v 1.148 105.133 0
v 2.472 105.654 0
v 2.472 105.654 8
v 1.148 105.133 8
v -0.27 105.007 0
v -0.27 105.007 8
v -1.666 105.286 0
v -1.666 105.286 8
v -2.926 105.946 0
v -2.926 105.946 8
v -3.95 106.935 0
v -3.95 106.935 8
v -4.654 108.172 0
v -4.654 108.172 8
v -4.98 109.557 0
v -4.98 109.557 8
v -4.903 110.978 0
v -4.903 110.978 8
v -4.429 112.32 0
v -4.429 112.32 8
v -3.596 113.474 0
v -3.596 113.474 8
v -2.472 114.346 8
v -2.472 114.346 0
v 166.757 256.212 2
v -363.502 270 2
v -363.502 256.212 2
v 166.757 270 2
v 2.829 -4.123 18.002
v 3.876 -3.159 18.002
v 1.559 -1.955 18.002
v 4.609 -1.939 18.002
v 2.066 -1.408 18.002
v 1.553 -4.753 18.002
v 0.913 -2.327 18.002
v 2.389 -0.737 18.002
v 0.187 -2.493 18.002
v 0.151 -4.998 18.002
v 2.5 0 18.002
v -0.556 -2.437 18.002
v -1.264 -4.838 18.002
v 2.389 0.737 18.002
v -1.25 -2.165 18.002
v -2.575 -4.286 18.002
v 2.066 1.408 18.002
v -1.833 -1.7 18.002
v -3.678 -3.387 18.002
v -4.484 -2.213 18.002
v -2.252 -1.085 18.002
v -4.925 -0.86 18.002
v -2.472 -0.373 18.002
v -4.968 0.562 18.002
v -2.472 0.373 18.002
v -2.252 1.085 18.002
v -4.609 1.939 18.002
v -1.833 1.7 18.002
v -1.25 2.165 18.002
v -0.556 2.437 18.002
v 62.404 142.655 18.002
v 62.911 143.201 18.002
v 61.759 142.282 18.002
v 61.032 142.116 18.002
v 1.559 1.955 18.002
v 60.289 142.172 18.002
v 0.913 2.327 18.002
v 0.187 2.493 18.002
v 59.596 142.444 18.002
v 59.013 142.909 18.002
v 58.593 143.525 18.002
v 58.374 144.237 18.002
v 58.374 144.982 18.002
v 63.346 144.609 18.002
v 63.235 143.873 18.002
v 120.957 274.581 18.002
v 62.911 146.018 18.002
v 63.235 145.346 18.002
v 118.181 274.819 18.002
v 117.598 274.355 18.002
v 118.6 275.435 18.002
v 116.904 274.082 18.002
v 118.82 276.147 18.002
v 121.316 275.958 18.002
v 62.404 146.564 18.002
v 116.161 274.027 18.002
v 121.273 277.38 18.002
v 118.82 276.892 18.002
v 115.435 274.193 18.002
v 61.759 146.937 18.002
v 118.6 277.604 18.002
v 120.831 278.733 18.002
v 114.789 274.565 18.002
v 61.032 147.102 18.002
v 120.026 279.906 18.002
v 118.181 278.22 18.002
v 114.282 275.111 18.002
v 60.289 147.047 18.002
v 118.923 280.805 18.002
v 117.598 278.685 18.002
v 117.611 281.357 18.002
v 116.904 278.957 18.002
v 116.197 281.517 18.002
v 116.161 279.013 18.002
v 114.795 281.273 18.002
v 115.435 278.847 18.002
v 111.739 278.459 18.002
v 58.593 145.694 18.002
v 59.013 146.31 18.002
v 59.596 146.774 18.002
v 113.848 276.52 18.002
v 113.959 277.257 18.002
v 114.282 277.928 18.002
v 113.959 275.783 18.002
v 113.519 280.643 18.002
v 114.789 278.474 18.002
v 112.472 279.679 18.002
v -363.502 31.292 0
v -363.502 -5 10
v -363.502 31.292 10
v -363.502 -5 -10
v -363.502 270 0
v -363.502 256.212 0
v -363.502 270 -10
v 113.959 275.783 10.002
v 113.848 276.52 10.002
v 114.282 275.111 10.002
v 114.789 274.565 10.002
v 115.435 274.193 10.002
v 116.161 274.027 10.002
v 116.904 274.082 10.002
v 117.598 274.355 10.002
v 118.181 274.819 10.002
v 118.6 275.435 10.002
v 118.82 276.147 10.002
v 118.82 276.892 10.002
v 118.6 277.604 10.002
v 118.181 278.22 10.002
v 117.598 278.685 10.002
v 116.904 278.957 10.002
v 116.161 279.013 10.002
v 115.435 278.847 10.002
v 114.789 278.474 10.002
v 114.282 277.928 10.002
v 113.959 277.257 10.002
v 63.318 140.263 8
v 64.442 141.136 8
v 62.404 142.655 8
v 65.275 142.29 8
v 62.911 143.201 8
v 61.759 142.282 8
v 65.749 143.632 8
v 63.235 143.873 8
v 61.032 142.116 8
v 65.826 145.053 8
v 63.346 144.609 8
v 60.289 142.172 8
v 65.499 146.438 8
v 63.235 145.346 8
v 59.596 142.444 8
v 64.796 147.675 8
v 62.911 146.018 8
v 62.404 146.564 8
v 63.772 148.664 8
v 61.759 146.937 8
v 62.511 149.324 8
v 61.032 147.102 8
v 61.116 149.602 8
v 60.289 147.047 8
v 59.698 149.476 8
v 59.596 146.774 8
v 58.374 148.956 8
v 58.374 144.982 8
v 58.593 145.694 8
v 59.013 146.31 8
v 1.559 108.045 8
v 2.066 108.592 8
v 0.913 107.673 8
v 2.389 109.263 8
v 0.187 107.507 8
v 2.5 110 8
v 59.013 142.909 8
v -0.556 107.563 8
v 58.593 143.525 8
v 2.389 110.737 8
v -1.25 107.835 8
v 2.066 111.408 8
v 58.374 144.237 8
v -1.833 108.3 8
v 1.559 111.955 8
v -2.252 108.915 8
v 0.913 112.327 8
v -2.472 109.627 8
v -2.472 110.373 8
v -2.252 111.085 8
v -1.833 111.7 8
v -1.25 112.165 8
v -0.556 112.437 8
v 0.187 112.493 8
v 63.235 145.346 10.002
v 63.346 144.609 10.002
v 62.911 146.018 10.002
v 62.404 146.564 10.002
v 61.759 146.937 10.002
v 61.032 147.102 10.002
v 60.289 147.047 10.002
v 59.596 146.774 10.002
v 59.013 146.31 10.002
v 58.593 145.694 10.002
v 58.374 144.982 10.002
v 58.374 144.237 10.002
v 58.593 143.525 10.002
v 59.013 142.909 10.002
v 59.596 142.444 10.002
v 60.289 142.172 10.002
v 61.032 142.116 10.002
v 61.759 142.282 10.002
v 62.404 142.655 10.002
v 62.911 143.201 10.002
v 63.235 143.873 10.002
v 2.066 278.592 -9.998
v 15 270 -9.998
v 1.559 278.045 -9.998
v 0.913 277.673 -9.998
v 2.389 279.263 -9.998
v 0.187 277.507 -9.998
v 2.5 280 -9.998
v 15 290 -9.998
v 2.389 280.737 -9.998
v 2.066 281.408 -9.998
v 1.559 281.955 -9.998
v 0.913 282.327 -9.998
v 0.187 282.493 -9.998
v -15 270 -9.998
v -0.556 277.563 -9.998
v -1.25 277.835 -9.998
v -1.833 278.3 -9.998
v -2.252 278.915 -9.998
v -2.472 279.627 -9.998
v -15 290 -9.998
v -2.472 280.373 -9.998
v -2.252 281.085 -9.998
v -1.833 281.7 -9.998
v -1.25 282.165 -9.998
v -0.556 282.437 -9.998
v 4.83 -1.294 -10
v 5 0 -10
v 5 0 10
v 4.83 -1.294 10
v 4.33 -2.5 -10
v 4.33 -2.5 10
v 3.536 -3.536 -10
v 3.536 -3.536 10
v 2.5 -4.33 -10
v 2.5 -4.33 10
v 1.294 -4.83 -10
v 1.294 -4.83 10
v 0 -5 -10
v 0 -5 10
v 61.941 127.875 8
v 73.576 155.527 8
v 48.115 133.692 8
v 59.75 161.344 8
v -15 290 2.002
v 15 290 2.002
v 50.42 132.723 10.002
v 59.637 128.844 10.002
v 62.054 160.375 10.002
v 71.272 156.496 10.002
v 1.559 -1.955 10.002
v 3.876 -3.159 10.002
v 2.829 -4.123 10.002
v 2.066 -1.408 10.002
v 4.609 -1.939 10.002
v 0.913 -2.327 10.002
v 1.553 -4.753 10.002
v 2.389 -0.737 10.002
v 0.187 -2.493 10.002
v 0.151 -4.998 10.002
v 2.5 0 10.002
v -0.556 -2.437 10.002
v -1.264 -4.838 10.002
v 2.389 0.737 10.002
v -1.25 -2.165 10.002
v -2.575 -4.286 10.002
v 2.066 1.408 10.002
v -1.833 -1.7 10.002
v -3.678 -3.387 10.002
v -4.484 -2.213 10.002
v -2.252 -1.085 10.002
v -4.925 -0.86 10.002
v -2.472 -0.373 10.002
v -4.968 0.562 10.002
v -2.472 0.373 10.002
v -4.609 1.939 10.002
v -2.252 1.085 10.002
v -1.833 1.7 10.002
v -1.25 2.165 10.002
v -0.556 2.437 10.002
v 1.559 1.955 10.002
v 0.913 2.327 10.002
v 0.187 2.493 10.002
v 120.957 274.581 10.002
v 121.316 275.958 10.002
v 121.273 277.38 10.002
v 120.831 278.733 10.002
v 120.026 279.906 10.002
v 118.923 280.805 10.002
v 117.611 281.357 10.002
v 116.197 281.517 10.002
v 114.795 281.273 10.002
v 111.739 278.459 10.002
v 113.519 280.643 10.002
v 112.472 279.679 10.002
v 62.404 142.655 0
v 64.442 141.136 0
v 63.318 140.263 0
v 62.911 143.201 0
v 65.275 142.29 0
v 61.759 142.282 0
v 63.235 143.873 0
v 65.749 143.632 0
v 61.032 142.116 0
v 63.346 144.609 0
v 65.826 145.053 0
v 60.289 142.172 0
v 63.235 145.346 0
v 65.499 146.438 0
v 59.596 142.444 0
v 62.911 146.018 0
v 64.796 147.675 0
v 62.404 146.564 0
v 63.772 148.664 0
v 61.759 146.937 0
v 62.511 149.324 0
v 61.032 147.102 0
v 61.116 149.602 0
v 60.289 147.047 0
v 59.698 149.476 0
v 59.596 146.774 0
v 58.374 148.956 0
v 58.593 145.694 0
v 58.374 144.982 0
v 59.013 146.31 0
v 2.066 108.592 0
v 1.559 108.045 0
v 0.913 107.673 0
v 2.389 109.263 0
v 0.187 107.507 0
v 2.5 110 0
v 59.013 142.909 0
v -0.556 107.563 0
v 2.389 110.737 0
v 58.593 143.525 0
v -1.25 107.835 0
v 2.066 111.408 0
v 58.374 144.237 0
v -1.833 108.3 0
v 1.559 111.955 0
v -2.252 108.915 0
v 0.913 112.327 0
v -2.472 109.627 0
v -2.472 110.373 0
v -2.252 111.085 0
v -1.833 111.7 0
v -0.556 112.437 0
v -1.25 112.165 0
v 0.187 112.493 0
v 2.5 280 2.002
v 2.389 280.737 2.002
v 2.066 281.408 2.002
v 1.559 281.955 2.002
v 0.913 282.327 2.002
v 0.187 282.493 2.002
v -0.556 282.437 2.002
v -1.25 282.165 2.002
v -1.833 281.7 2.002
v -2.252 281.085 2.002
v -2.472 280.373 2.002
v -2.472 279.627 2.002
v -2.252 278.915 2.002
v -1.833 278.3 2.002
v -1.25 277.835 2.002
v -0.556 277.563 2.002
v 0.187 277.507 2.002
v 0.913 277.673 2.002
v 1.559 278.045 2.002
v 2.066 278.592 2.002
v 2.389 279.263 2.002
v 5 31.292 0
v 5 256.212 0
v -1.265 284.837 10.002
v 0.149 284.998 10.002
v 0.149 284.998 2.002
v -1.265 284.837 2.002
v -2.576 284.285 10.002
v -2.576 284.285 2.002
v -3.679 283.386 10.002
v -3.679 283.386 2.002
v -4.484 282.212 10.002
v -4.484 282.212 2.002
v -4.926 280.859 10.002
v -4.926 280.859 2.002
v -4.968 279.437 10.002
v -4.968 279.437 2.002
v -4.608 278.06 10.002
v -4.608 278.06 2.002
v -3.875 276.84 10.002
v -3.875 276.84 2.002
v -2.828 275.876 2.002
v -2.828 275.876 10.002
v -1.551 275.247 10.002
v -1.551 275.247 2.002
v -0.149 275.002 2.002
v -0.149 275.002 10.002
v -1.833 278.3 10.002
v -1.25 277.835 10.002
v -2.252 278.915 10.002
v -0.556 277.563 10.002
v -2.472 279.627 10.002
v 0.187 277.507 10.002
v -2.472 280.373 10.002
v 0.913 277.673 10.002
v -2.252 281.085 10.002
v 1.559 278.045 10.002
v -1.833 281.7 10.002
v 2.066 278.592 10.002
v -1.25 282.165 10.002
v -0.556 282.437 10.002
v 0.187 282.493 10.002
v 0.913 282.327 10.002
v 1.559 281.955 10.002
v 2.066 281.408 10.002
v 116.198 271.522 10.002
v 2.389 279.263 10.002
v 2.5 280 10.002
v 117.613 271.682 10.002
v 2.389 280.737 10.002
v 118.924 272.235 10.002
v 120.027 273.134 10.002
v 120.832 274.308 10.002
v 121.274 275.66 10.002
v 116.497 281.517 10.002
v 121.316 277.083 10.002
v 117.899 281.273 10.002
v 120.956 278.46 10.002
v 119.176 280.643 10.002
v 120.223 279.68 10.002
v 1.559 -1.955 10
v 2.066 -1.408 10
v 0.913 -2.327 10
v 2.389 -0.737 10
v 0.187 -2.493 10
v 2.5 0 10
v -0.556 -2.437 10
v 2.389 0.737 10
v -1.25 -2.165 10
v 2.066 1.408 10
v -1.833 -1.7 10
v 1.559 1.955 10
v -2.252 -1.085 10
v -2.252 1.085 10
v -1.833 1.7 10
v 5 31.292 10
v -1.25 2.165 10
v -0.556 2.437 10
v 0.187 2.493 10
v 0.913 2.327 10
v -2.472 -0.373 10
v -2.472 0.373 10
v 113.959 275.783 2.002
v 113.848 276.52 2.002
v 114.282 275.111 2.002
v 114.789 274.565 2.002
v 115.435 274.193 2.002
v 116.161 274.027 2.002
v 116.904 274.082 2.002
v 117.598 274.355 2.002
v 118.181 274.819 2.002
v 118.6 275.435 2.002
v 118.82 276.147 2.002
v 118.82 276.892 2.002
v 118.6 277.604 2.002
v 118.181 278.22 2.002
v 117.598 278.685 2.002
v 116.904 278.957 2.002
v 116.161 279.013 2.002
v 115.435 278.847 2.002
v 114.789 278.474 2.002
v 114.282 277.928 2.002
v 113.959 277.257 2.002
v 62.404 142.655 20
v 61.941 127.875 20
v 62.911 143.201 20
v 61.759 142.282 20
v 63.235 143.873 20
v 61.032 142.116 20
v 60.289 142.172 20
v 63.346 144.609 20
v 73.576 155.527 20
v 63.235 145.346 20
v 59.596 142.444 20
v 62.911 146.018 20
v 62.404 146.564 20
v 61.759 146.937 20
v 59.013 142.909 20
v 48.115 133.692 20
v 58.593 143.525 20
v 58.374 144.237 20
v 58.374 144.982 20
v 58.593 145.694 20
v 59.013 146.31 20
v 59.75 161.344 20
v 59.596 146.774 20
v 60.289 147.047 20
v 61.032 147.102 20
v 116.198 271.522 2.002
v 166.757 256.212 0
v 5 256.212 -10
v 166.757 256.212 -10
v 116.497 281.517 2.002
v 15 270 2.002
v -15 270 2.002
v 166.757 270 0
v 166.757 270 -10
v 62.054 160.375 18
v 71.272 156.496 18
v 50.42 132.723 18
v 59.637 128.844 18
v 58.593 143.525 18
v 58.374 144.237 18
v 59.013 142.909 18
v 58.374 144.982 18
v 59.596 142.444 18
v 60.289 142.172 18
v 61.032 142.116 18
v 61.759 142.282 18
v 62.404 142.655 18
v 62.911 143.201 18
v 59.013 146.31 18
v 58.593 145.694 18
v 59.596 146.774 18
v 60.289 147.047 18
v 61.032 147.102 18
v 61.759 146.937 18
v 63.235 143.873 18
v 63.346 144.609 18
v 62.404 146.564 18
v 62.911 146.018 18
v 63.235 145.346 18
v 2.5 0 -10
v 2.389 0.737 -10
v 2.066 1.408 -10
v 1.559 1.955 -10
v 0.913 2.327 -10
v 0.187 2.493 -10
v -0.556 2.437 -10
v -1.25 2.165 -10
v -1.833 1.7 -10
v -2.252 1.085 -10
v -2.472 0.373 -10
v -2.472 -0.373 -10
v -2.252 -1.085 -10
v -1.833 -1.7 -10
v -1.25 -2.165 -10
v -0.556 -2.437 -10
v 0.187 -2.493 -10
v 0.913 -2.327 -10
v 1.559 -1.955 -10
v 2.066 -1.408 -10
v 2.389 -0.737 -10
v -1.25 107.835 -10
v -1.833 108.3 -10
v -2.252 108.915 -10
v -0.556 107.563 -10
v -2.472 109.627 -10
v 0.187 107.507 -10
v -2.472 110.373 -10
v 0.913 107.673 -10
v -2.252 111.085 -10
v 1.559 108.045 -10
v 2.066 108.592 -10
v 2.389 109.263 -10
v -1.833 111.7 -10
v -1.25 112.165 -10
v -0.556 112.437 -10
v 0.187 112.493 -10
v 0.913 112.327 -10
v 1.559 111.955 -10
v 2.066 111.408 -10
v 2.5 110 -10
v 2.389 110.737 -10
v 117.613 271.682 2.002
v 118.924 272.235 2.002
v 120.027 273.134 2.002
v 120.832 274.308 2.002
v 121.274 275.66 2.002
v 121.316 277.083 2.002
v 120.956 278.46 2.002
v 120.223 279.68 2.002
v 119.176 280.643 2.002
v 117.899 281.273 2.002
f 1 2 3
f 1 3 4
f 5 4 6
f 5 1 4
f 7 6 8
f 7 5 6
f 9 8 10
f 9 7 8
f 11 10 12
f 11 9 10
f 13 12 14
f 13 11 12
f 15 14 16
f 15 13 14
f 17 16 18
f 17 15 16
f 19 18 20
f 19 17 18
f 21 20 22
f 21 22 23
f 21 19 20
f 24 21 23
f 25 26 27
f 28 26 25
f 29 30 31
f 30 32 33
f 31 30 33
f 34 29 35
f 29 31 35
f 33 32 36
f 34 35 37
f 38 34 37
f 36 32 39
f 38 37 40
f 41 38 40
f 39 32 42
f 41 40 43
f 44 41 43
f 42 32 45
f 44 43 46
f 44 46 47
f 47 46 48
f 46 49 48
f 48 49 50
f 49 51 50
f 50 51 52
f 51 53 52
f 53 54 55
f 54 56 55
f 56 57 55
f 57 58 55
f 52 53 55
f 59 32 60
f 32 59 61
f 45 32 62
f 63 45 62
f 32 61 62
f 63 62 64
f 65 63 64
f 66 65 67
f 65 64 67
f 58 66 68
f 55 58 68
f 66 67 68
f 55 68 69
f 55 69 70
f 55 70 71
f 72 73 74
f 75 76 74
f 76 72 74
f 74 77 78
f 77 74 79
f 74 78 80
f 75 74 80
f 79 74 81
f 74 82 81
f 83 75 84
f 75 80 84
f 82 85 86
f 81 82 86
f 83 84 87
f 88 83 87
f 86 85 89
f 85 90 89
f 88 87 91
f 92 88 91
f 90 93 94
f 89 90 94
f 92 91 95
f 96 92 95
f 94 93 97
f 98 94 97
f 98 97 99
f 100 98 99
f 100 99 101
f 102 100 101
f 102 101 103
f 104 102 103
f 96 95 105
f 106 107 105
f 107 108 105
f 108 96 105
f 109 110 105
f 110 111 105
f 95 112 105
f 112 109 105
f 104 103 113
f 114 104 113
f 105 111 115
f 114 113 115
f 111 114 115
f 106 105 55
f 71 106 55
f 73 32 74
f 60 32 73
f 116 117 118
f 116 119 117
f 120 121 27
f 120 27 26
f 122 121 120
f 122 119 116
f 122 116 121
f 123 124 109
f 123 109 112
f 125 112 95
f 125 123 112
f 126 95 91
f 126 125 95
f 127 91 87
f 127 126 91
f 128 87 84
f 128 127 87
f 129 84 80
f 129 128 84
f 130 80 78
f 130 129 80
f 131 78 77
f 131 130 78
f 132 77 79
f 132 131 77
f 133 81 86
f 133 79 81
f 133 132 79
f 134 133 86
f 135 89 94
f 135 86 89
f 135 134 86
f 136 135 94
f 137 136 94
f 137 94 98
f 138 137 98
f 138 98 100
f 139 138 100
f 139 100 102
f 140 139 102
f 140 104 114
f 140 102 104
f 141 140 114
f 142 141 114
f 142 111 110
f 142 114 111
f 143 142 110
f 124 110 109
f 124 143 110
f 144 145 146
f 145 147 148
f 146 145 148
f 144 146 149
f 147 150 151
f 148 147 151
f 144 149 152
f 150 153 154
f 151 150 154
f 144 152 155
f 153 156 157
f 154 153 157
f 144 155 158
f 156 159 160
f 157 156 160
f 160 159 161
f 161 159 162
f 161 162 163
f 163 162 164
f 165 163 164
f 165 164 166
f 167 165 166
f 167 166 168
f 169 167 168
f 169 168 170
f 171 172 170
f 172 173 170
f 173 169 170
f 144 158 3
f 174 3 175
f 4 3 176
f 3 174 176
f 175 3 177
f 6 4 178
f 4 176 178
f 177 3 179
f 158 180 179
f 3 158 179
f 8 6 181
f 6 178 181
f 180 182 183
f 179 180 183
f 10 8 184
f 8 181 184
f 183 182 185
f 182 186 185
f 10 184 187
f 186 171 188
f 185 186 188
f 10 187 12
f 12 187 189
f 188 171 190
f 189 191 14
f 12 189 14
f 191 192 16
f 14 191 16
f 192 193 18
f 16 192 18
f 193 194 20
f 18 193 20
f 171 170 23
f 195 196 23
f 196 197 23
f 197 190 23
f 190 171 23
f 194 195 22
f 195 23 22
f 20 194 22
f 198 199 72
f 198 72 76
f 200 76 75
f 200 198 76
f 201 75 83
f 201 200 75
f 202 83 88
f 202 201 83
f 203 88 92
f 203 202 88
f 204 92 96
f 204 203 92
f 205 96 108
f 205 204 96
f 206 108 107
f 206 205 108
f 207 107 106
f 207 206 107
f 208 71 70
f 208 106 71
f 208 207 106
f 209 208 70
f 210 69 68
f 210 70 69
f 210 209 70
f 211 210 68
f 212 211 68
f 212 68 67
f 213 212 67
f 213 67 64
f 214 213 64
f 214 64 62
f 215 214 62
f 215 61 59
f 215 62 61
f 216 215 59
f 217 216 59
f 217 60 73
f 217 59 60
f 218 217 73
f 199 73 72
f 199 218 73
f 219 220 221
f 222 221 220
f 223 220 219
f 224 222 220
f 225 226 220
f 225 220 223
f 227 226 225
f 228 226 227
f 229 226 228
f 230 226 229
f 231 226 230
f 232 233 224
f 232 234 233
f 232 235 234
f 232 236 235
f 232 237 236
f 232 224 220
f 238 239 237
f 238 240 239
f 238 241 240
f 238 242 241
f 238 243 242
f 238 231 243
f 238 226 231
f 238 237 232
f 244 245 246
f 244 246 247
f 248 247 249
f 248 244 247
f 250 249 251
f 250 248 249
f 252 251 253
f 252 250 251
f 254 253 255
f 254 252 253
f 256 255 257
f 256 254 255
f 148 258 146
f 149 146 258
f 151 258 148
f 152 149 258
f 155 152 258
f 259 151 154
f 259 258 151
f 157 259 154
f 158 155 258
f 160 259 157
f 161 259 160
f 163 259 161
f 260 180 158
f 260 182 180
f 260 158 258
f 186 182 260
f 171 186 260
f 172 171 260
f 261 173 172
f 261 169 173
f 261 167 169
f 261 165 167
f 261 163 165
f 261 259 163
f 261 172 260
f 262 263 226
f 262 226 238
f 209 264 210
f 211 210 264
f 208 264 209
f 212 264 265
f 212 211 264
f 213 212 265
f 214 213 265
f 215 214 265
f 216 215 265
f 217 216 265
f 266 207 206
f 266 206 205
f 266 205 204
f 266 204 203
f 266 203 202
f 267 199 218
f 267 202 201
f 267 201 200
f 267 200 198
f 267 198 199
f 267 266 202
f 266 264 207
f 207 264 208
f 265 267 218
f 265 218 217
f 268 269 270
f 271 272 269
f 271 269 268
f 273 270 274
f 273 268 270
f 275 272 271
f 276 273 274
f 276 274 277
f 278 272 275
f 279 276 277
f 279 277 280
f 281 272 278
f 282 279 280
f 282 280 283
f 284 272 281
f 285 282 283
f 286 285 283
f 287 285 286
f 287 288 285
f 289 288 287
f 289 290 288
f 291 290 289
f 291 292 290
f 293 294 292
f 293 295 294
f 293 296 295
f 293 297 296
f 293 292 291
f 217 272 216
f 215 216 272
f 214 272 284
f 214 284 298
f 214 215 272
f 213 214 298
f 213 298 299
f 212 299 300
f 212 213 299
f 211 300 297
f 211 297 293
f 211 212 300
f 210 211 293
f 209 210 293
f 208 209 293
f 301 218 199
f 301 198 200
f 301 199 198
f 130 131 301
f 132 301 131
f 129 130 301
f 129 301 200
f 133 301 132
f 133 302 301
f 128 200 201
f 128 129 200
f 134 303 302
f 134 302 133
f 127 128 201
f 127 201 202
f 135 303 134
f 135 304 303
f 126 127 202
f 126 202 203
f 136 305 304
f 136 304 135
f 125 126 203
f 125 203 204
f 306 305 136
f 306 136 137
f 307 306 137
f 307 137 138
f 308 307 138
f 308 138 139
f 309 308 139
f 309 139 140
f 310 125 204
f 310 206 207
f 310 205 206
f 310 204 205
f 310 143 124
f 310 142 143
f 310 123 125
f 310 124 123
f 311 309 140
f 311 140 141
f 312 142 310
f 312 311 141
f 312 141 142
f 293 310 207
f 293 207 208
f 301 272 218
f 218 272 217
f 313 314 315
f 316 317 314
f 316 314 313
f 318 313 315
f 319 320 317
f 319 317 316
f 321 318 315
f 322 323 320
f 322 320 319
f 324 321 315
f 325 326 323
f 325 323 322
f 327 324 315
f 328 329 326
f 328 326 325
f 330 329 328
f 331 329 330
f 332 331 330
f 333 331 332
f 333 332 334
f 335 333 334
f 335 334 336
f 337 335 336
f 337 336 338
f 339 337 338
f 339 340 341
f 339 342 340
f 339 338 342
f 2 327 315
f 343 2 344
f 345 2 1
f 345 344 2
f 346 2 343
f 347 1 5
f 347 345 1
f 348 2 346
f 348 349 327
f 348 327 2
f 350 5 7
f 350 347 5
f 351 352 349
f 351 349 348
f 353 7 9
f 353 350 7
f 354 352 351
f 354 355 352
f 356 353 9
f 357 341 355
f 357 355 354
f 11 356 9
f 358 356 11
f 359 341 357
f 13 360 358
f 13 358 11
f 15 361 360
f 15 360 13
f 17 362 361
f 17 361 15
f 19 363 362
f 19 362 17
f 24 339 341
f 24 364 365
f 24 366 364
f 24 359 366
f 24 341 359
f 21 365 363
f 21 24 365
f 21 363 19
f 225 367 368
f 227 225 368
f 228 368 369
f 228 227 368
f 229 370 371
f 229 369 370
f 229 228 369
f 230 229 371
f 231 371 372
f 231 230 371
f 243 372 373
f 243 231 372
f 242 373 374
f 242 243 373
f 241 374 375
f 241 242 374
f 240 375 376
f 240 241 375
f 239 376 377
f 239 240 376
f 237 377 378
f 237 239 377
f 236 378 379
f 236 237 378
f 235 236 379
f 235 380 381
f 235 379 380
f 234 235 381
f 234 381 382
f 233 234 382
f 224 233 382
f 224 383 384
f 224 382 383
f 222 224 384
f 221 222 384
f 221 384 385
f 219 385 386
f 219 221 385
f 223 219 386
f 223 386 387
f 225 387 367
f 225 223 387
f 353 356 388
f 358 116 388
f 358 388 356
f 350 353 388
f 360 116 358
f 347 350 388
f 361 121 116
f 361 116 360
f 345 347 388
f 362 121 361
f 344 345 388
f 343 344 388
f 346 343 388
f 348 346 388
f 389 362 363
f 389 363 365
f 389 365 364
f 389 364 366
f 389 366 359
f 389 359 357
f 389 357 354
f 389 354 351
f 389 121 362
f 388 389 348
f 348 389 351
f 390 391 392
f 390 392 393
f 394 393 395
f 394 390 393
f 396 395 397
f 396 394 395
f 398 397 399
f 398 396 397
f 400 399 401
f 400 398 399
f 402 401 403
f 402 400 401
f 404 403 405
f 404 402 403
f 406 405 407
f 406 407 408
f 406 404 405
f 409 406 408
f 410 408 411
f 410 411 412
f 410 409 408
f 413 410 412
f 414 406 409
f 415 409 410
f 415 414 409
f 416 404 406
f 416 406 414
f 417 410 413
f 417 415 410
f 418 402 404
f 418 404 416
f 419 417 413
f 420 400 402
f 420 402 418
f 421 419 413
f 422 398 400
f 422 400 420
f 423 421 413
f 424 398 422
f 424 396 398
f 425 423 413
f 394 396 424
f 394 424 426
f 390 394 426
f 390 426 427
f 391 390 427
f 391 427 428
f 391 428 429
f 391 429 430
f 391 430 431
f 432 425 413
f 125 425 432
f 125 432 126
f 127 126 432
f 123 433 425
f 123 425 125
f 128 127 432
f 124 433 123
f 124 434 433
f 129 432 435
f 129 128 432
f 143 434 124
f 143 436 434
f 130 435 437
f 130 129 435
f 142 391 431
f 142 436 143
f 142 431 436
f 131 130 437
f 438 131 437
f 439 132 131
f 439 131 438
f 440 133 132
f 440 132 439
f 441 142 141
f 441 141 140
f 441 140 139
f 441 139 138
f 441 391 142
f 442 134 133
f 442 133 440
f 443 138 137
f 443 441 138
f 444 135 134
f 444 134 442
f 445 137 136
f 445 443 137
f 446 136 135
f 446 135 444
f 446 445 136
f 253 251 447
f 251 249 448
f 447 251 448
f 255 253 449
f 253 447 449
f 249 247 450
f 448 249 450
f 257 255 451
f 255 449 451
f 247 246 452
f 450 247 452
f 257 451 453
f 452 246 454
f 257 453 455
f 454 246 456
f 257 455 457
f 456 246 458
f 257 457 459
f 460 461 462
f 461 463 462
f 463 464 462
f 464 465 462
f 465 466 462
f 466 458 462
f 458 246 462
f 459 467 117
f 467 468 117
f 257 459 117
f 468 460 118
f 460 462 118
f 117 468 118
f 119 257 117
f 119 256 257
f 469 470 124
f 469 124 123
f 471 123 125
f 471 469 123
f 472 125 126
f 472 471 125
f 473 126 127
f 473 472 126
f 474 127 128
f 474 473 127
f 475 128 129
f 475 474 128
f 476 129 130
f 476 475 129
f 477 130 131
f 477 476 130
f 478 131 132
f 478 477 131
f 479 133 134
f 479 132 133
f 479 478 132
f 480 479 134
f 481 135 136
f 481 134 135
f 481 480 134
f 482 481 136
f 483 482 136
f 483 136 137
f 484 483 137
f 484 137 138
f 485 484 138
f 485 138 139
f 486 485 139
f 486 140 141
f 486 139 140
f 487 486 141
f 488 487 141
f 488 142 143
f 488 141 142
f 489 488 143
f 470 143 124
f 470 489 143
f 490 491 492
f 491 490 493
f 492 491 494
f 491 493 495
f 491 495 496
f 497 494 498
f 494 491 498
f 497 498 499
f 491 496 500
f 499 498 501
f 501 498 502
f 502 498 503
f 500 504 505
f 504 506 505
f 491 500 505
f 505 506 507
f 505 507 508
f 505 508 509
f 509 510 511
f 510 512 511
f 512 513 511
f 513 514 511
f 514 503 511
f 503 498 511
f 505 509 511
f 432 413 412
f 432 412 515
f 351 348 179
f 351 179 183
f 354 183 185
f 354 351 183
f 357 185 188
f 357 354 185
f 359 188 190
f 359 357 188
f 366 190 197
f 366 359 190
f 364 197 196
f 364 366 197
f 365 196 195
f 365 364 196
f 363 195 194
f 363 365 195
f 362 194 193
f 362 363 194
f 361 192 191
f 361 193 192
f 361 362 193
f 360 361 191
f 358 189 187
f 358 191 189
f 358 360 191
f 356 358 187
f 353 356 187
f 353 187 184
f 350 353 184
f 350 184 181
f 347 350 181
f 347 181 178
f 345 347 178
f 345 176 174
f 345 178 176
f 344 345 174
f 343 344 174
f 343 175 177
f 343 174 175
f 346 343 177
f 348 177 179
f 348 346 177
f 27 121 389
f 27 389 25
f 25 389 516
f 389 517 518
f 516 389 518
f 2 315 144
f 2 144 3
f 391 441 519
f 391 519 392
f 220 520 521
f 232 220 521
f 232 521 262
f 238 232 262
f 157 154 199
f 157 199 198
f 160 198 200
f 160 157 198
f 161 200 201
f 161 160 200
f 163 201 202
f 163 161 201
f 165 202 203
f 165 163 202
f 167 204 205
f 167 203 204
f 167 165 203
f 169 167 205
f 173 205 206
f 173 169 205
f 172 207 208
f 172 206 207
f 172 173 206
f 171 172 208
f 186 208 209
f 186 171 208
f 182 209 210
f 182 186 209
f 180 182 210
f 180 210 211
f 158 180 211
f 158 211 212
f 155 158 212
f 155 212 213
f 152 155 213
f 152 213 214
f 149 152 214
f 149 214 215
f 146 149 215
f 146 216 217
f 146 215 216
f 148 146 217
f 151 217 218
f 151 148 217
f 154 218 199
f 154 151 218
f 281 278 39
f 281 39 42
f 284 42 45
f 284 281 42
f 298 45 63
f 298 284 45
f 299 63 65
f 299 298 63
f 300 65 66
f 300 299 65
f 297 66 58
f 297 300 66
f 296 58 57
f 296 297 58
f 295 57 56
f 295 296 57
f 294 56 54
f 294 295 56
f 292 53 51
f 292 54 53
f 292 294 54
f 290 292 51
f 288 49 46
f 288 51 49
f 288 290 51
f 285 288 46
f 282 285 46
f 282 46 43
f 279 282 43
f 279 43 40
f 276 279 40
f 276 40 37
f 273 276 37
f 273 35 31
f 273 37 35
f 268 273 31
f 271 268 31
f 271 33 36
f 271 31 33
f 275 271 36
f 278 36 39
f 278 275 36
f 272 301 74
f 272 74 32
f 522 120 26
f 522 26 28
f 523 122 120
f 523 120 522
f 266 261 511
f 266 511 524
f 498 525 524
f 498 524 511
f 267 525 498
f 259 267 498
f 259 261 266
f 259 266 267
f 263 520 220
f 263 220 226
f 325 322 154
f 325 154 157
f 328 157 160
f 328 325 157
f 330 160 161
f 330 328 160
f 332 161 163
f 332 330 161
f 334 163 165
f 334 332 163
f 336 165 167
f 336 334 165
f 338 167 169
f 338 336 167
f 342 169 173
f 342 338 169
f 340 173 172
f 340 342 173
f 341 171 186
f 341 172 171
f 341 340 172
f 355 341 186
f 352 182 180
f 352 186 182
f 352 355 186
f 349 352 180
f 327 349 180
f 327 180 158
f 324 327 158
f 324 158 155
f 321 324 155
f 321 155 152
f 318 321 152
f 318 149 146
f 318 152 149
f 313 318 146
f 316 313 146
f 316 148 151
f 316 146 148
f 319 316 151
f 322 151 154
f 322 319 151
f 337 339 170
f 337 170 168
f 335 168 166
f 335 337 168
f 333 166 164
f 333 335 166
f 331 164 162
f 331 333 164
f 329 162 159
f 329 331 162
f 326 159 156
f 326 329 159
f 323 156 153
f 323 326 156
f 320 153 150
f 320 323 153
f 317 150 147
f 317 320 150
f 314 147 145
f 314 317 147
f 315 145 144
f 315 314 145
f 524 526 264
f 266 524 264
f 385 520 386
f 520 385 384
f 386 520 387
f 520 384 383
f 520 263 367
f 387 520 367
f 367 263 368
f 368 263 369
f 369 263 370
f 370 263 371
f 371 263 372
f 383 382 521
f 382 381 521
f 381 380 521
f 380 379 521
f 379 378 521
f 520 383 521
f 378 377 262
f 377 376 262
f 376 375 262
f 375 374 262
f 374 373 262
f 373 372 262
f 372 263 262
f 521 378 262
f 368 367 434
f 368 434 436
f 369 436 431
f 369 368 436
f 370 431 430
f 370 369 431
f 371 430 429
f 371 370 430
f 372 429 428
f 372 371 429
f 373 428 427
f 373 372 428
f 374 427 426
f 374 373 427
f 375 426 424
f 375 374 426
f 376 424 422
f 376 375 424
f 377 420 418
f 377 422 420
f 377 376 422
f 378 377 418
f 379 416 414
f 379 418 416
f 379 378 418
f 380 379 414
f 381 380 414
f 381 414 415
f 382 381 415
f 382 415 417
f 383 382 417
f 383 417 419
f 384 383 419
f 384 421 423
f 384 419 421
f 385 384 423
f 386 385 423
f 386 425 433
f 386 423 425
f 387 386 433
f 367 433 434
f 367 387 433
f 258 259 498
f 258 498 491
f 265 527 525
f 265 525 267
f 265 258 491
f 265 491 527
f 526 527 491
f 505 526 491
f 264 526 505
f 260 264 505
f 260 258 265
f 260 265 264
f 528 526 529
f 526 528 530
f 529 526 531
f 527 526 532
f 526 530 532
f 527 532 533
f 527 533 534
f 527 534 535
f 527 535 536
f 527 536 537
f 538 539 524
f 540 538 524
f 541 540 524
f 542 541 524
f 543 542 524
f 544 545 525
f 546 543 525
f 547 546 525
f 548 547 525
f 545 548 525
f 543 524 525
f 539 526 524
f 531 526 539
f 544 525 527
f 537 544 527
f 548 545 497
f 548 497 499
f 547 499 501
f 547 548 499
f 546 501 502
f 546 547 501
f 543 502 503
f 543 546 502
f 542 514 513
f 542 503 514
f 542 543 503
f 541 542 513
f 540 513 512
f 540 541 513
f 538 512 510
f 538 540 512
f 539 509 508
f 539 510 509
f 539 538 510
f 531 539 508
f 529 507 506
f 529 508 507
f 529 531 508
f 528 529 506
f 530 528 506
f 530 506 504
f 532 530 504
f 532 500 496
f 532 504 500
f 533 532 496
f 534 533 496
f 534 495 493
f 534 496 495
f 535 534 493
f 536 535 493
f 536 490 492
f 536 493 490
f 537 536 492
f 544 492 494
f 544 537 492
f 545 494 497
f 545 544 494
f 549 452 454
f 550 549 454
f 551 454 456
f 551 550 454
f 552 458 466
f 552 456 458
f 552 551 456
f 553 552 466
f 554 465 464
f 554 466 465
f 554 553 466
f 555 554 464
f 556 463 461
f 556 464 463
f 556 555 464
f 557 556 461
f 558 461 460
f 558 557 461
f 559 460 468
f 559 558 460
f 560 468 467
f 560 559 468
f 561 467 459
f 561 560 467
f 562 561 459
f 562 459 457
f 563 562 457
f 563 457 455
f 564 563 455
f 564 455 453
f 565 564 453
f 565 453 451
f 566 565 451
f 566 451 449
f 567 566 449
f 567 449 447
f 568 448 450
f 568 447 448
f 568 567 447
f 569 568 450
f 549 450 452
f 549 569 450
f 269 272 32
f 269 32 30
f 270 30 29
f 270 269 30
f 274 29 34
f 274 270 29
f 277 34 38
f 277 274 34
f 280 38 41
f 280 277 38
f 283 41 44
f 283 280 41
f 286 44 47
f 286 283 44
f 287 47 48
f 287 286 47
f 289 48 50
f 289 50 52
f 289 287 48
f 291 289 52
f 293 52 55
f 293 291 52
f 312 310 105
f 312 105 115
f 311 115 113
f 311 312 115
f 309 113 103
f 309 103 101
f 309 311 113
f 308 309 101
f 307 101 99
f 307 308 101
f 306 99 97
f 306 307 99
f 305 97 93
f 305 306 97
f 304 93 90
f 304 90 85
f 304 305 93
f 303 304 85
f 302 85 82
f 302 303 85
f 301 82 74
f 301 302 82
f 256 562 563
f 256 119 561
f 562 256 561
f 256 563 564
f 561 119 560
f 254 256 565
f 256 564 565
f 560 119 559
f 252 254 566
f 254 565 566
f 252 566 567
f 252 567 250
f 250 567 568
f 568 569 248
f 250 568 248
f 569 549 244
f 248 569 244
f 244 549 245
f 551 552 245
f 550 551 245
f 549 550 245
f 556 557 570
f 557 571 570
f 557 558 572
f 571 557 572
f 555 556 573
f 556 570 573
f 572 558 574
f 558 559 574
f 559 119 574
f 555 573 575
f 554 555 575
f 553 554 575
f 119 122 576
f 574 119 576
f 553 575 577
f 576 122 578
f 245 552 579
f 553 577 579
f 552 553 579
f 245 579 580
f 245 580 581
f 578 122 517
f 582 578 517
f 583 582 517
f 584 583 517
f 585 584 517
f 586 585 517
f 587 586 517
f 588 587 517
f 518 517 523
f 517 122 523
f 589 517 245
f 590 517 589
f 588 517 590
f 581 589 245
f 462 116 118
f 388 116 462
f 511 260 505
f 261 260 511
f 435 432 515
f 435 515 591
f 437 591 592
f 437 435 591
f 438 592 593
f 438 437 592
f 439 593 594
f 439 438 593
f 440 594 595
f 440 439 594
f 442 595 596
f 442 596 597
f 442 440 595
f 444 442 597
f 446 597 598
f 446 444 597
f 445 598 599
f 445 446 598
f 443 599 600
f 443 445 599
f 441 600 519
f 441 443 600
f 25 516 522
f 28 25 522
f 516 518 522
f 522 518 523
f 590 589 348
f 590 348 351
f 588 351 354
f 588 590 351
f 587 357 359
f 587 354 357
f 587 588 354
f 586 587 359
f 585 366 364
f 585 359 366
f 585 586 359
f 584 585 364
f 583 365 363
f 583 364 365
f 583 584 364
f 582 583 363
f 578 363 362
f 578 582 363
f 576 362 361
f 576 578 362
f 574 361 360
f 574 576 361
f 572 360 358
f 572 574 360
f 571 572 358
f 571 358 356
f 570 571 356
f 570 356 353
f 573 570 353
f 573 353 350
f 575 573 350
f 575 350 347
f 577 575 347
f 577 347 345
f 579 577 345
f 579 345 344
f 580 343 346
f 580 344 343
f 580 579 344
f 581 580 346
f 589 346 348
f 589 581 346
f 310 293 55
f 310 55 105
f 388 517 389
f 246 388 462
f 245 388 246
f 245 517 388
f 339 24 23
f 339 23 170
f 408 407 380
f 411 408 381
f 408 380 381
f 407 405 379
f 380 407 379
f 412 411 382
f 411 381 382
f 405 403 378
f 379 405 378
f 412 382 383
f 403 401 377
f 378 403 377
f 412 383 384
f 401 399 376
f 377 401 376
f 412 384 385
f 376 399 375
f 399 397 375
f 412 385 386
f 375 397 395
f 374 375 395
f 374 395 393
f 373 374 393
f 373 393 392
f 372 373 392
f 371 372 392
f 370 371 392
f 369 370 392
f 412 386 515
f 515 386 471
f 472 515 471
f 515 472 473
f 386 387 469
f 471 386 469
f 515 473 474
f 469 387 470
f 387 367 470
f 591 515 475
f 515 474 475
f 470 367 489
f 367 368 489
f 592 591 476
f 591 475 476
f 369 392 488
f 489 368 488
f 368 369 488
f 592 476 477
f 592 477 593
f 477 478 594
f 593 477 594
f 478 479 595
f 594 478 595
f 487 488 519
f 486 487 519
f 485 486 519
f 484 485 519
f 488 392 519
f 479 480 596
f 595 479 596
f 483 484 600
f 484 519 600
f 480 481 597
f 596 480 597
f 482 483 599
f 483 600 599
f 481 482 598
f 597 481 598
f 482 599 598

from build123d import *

# Parameters (mm, degrees)
BOSS_EXTRUDE2_DEPTH     = 8
BOSS_EXTRUDE5_DEPTH     = 12
SKETCH6_W               = 10
SKETCH6_H               = 7.997952507
CUT_EXTRUDE1_DEPTH      = 35
BOSS_EXTRUDE6_DEPTH     = 8
BOSS_EXTRUDE7_DEPTH     = 8
SKETCH10_W              = 30
SKETCH10_H              = 20
BOSS_EXTRUDE9_DEPTH     = 12
CUT_EXTRUDE5_DEPTH      = 316.00051937
CUT_EXTRUDE5_DEPTH_BACK = 316.00051937
SKETCH16_R              = 2.5
BOSS_EXTRUDE10_DEPTH    = 10
SKETCH14_W              = 530.258658084
SKETCH14_H              = 13.787893997
BOSS_EXTRUDE11_DEPTH    = 2
BOSS_EXTRUDE12_DEPTH    = 10
CUT_EXTRUDE2_DEPTH      = 466.439357436
CUT_EXTRUDE2_DEPTH_BACK = 466.439357436
SKETCH11_R              = 2.5


with BuildPart() as part:
    # Sketch3 → Boss-Extrude2 (new body)
    with BuildSketch(Plane.XY):
        with BuildLine():
            Line((-2.472101251, 114.346114978), (58.373508448, 148.955532489))
            ThreePointArc((58.373508448, 148.955532489), (65.191724677, 147.081518762), (63.317710949, 140.263302532))
            Line((63.317710949, 140.263302532), (2.472101251, 105.653885022))
            ThreePointArc((2.472101251, 105.653885022), (-4.346114978, 107.527898749), (-2.472101251, 114.346114978))
        make_face()
    extrude(amount=BOSS_EXTRUDE2_DEPTH)


with BuildPart() as body_2:
    # Sketch5 → Boss-Extrude5 (new body)
    with BuildSketch(Plane.XY.offset(8)):
        Polygon((59.750014801, 161.344102205), (73.576000516, 155.526704245), (61.941204595, 127.874732816), (48.115218881, 133.692130777), align=None)
    extrude(amount=BOSS_EXTRUDE5_DEPTH)

    # Sketch6 → Cut-Extrude1 (cut)
    with BuildSketch(Plane(origin=(66.663007659, 158.435403225, 0), x_dir=(0.921732380952381, -0.387826530685892, 0), z_dir=(0.387826530685892, 0.921732380952381, 0))):
        with Locations((0, -14.001023746)):
            Rectangle(SKETCH6_W, SKETCH6_H)
    extrude(amount=-CUT_EXTRUDE1_DEPTH, mode=Mode.SUBTRACT)


with BuildPart() as body_3:
    # Sketch8 → Boss-Extrude6 (new body)
    with BuildSketch(Plane.XY.offset(10.002047493)):
        with BuildLine():
            Line((-4.608661905, 1.939132653), (111.739297301, 278.458846939))
            ThreePointArc((111.739297301, 278.458846939), (118.287091859, 281.12837619), (120.956621111, 274.580581632))
            Line((120.956621111, 274.580581632), (4.608661905, -1.939132653))
            ThreePointArc((4.608661905, -1.939132653), (-1.939132653, -4.608661905), (-4.608661905, 1.939132653))
        make_face()
    extrude(amount=BOSS_EXTRUDE6_DEPTH)


with BuildPart() as body_4:
    # Sketch9 → Boss-Extrude7 (new body)
    with BuildSketch(Plane(origin=(0, 0, 10.002047493), x_dir=(-1, 0, 0), z_dir=(0, 0, -1))):
        with BuildLine():
            Line((-116.497456015, 281.517478856), (-0.149496809, 284.997764571))
            ThreePointArc((-0.149496809, 284.997764571), (4.997764571, 280.149496809), (0.149496809, 275.002235429))
            Line((0.149496809, 275.002235429), (-116.198462397, 271.521949715))
            ThreePointArc((-116.198462397, 271.521949715), (-121.345723776, 276.370217477), (-116.497456015, 281.517478856))
        make_face()
    extrude(amount=BOSS_EXTRUDE7_DEPTH)


with BuildPart() as body_5:
    # Sketch10 → Boss-Extrude9 (new body)
    with BuildSketch(Plane(origin=(0, 0, 2.002047493), x_dir=(-1, 0, 0), z_dir=(0, 0, -1))):
        with Locations((0, 280)):
            Rectangle(SKETCH10_W, SKETCH10_H)
    extrude(amount=BOSS_EXTRUDE9_DEPTH)


with BuildPart() as cut_extrude5_tool:
    # Sketch16 → Cut-Extrude5 (new, two sides: drawn at the far end of the back side and taken through both)
    with BuildSketch(Plane.XY.offset(-CUT_EXTRUDE5_DEPTH_BACK)):
        with Locations((0, 280)):
            Circle(SKETCH16_R)
        with Locations(Location((116.347959206, 276.519714286, 0), (0, 0, 180))):
            Circle(SKETCH16_R)
        with Locations((0, 110)):
            Circle(SKETCH16_R)
        Circle(SKETCH16_R)
        with Locations((60.845609698, 144.609417511)):
            Circle(SKETCH16_R)
    extrude(amount=CUT_EXTRUDE5_DEPTH + CUT_EXTRUDE5_DEPTH_BACK)


with BuildPart() as part_1:
    add(part.part)

    # Cut-Extrude5: cut by cut_extrude5_tool
    add(cut_extrude5_tool.part, mode=Mode.SUBTRACT)


with BuildPart() as body_2_1:
    add(body_2.part)

    # Cut-Extrude5: cut by cut_extrude5_tool
    add(cut_extrude5_tool.part, mode=Mode.SUBTRACT)


with BuildPart() as body_3_1:
    add(body_3.part)

    # Cut-Extrude5: cut by cut_extrude5_tool
    add(cut_extrude5_tool.part, mode=Mode.SUBTRACT)


with BuildPart() as body_4_1:
    add(body_4.part)

    # Cut-Extrude5: cut by cut_extrude5_tool
    add(cut_extrude5_tool.part, mode=Mode.SUBTRACT)


with BuildPart() as body_5_1:
    add(body_5.part)

    # Cut-Extrude5: cut by cut_extrude5_tool
    add(cut_extrude5_tool.part, mode=Mode.SUBTRACT)


with BuildPart() as body_6:
    # Sketch12 → Boss-Extrude10 (new body)
    with BuildSketch(Plane.XY):
        with BuildLine():
            Line((166.756532299, 270), (-363.502125785, 270))
            Line((-363.502125785, 270), (-363.502125785, -5))
            Line((-363.502125785, -5), (0, -5))
            ThreePointArc((0, -5), (3.535533906, -3.535533906), (5, 0))
            Line((5, 0), (5, 256.212106003))
            Line((5, 256.212106003), (166.756532299, 256.212106003))
            Line((166.756532299, 256.212106003), (166.756532299, 270))
        make_face()
    extrude(amount=-BOSS_EXTRUDE10_DEPTH)

    # Sketch14 → Boss-Extrude11 (add)
    with BuildSketch(Plane.XY):
        with Locations((-98.372796743, 263.106053002)):
            Rectangle(SKETCH14_W, SKETCH14_H)
    extrude(amount=BOSS_EXTRUDE11_DEPTH)

    # Sketch15 → Boss-Extrude12 (add)
    with BuildSketch(Plane.XY):
        with BuildLine():
            Line((-363.502125785, 31.29174962), (5, 31.29174962))
            Line((5, 31.29174962), (5, 0))
            ThreePointArc((5, 0), (3.535533906, -3.535533906), (0, -5))
            Line((0, -5), (-363.502125785, -5))
            Line((-363.502125785, -5), (-363.502125785, 31.29174962))
        make_face()
    extrude(amount=BOSS_EXTRUDE12_DEPTH)

    # Sketch11 → Cut-Extrude2 (cut, two sides: drawn at the far end of the back side and taken through both)
    with BuildSketch(Plane.XY.offset(-CUT_EXTRUDE2_DEPTH_BACK)):
        with Locations((0, 280)):
            Circle(SKETCH11_R)
        with Locations(Location((116.347959206, 276.519714286, 0), (0, 0, 180))):
            Circle(SKETCH11_R)
        with Locations((60.845609698, 144.609417511)):
            Circle(SKETCH11_R)
        with Locations((0, 110)):
            Circle(SKETCH11_R)
        Circle(SKETCH11_R)
    extrude(amount=CUT_EXTRUDE2_DEPTH + CUT_EXTRUDE2_DEPTH_BACK, mode=Mode.SUBTRACT)


solid = Compound([part_1.part, body_2_1.part, body_3_1.part, body_4_1.part, body_5_1.part, body_6.part])
